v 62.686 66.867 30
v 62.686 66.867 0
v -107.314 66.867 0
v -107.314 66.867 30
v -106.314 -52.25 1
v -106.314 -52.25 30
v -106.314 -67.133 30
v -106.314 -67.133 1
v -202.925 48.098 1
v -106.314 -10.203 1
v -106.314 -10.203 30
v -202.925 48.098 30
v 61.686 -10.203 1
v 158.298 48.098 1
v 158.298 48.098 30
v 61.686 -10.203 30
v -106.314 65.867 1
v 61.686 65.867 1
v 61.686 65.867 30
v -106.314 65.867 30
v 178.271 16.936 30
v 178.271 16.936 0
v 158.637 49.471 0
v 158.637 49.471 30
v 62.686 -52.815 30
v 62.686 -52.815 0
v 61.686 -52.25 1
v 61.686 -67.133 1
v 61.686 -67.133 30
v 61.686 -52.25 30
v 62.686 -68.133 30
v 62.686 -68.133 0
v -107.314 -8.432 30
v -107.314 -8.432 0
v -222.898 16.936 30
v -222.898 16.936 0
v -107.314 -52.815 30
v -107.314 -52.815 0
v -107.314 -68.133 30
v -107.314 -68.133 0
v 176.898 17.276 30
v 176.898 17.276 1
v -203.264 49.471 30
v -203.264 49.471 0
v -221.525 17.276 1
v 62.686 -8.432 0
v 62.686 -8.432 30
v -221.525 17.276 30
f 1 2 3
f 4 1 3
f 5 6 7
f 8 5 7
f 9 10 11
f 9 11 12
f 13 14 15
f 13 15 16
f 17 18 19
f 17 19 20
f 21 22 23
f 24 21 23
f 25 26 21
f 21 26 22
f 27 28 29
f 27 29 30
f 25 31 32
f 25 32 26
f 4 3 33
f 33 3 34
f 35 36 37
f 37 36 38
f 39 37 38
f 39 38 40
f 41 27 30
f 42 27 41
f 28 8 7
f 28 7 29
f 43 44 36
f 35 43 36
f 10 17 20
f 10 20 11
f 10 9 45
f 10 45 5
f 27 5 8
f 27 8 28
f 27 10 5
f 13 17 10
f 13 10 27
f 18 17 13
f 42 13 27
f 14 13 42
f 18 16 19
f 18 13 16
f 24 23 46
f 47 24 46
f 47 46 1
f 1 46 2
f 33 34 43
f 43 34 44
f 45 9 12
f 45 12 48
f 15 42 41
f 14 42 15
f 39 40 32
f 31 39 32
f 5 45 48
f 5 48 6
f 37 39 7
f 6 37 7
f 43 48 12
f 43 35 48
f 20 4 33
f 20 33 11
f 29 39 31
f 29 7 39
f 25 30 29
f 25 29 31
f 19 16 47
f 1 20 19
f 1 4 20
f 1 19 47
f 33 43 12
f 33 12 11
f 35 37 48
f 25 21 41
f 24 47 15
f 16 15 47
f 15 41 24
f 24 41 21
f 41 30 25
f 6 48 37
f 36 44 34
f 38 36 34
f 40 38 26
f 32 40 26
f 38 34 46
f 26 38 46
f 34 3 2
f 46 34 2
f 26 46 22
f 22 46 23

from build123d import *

# Parameters (mm, degrees)
F1_DEPTH = 30
F2_T     = -1


with BuildPart() as f1:
    # F0 (on Top) → F1 (new body)
    with BuildSketch(Plane.XY):
        Polygon((62.6864729471, -8.4317315359), (62.6864729471, 66.8668336705), (-107.3135270529, 66.8668336705), (-107.3135270529, 45.8668336705), (-107.3135270529, -8.4317315359), (-107.3135270529, -52.8148650094), (-107.3135270529, -68.1331663295), (62.6864729471, -68.1331663295), (62.6864729471, -52.8148650094), align=None)
        Polygon((158.6372393407, 49.4712554003), (62.6864729471, -8.4317315359), (62.6864729471, -52.8148650094), (178.2709213291, 16.9363736336), align=None)
        Polygon((-107.3135270529, -52.8148650094), (-107.3135270529, -8.4317315359), (-203.2642934464, 49.4712554003), (-222.8979754349, 16.9363736336), align=None)
    extrude(amount=F1_DEPTH)

    # F2
    f2_openings = [f1.faces().sort_by_distance(p)[0] for p in [
        (-22.313527, -0.247476, 30),
    ]]
    offset(amount=F2_T, openings=f2_openings, kind=Kind.INTERSECTION)


solid = f1.part
